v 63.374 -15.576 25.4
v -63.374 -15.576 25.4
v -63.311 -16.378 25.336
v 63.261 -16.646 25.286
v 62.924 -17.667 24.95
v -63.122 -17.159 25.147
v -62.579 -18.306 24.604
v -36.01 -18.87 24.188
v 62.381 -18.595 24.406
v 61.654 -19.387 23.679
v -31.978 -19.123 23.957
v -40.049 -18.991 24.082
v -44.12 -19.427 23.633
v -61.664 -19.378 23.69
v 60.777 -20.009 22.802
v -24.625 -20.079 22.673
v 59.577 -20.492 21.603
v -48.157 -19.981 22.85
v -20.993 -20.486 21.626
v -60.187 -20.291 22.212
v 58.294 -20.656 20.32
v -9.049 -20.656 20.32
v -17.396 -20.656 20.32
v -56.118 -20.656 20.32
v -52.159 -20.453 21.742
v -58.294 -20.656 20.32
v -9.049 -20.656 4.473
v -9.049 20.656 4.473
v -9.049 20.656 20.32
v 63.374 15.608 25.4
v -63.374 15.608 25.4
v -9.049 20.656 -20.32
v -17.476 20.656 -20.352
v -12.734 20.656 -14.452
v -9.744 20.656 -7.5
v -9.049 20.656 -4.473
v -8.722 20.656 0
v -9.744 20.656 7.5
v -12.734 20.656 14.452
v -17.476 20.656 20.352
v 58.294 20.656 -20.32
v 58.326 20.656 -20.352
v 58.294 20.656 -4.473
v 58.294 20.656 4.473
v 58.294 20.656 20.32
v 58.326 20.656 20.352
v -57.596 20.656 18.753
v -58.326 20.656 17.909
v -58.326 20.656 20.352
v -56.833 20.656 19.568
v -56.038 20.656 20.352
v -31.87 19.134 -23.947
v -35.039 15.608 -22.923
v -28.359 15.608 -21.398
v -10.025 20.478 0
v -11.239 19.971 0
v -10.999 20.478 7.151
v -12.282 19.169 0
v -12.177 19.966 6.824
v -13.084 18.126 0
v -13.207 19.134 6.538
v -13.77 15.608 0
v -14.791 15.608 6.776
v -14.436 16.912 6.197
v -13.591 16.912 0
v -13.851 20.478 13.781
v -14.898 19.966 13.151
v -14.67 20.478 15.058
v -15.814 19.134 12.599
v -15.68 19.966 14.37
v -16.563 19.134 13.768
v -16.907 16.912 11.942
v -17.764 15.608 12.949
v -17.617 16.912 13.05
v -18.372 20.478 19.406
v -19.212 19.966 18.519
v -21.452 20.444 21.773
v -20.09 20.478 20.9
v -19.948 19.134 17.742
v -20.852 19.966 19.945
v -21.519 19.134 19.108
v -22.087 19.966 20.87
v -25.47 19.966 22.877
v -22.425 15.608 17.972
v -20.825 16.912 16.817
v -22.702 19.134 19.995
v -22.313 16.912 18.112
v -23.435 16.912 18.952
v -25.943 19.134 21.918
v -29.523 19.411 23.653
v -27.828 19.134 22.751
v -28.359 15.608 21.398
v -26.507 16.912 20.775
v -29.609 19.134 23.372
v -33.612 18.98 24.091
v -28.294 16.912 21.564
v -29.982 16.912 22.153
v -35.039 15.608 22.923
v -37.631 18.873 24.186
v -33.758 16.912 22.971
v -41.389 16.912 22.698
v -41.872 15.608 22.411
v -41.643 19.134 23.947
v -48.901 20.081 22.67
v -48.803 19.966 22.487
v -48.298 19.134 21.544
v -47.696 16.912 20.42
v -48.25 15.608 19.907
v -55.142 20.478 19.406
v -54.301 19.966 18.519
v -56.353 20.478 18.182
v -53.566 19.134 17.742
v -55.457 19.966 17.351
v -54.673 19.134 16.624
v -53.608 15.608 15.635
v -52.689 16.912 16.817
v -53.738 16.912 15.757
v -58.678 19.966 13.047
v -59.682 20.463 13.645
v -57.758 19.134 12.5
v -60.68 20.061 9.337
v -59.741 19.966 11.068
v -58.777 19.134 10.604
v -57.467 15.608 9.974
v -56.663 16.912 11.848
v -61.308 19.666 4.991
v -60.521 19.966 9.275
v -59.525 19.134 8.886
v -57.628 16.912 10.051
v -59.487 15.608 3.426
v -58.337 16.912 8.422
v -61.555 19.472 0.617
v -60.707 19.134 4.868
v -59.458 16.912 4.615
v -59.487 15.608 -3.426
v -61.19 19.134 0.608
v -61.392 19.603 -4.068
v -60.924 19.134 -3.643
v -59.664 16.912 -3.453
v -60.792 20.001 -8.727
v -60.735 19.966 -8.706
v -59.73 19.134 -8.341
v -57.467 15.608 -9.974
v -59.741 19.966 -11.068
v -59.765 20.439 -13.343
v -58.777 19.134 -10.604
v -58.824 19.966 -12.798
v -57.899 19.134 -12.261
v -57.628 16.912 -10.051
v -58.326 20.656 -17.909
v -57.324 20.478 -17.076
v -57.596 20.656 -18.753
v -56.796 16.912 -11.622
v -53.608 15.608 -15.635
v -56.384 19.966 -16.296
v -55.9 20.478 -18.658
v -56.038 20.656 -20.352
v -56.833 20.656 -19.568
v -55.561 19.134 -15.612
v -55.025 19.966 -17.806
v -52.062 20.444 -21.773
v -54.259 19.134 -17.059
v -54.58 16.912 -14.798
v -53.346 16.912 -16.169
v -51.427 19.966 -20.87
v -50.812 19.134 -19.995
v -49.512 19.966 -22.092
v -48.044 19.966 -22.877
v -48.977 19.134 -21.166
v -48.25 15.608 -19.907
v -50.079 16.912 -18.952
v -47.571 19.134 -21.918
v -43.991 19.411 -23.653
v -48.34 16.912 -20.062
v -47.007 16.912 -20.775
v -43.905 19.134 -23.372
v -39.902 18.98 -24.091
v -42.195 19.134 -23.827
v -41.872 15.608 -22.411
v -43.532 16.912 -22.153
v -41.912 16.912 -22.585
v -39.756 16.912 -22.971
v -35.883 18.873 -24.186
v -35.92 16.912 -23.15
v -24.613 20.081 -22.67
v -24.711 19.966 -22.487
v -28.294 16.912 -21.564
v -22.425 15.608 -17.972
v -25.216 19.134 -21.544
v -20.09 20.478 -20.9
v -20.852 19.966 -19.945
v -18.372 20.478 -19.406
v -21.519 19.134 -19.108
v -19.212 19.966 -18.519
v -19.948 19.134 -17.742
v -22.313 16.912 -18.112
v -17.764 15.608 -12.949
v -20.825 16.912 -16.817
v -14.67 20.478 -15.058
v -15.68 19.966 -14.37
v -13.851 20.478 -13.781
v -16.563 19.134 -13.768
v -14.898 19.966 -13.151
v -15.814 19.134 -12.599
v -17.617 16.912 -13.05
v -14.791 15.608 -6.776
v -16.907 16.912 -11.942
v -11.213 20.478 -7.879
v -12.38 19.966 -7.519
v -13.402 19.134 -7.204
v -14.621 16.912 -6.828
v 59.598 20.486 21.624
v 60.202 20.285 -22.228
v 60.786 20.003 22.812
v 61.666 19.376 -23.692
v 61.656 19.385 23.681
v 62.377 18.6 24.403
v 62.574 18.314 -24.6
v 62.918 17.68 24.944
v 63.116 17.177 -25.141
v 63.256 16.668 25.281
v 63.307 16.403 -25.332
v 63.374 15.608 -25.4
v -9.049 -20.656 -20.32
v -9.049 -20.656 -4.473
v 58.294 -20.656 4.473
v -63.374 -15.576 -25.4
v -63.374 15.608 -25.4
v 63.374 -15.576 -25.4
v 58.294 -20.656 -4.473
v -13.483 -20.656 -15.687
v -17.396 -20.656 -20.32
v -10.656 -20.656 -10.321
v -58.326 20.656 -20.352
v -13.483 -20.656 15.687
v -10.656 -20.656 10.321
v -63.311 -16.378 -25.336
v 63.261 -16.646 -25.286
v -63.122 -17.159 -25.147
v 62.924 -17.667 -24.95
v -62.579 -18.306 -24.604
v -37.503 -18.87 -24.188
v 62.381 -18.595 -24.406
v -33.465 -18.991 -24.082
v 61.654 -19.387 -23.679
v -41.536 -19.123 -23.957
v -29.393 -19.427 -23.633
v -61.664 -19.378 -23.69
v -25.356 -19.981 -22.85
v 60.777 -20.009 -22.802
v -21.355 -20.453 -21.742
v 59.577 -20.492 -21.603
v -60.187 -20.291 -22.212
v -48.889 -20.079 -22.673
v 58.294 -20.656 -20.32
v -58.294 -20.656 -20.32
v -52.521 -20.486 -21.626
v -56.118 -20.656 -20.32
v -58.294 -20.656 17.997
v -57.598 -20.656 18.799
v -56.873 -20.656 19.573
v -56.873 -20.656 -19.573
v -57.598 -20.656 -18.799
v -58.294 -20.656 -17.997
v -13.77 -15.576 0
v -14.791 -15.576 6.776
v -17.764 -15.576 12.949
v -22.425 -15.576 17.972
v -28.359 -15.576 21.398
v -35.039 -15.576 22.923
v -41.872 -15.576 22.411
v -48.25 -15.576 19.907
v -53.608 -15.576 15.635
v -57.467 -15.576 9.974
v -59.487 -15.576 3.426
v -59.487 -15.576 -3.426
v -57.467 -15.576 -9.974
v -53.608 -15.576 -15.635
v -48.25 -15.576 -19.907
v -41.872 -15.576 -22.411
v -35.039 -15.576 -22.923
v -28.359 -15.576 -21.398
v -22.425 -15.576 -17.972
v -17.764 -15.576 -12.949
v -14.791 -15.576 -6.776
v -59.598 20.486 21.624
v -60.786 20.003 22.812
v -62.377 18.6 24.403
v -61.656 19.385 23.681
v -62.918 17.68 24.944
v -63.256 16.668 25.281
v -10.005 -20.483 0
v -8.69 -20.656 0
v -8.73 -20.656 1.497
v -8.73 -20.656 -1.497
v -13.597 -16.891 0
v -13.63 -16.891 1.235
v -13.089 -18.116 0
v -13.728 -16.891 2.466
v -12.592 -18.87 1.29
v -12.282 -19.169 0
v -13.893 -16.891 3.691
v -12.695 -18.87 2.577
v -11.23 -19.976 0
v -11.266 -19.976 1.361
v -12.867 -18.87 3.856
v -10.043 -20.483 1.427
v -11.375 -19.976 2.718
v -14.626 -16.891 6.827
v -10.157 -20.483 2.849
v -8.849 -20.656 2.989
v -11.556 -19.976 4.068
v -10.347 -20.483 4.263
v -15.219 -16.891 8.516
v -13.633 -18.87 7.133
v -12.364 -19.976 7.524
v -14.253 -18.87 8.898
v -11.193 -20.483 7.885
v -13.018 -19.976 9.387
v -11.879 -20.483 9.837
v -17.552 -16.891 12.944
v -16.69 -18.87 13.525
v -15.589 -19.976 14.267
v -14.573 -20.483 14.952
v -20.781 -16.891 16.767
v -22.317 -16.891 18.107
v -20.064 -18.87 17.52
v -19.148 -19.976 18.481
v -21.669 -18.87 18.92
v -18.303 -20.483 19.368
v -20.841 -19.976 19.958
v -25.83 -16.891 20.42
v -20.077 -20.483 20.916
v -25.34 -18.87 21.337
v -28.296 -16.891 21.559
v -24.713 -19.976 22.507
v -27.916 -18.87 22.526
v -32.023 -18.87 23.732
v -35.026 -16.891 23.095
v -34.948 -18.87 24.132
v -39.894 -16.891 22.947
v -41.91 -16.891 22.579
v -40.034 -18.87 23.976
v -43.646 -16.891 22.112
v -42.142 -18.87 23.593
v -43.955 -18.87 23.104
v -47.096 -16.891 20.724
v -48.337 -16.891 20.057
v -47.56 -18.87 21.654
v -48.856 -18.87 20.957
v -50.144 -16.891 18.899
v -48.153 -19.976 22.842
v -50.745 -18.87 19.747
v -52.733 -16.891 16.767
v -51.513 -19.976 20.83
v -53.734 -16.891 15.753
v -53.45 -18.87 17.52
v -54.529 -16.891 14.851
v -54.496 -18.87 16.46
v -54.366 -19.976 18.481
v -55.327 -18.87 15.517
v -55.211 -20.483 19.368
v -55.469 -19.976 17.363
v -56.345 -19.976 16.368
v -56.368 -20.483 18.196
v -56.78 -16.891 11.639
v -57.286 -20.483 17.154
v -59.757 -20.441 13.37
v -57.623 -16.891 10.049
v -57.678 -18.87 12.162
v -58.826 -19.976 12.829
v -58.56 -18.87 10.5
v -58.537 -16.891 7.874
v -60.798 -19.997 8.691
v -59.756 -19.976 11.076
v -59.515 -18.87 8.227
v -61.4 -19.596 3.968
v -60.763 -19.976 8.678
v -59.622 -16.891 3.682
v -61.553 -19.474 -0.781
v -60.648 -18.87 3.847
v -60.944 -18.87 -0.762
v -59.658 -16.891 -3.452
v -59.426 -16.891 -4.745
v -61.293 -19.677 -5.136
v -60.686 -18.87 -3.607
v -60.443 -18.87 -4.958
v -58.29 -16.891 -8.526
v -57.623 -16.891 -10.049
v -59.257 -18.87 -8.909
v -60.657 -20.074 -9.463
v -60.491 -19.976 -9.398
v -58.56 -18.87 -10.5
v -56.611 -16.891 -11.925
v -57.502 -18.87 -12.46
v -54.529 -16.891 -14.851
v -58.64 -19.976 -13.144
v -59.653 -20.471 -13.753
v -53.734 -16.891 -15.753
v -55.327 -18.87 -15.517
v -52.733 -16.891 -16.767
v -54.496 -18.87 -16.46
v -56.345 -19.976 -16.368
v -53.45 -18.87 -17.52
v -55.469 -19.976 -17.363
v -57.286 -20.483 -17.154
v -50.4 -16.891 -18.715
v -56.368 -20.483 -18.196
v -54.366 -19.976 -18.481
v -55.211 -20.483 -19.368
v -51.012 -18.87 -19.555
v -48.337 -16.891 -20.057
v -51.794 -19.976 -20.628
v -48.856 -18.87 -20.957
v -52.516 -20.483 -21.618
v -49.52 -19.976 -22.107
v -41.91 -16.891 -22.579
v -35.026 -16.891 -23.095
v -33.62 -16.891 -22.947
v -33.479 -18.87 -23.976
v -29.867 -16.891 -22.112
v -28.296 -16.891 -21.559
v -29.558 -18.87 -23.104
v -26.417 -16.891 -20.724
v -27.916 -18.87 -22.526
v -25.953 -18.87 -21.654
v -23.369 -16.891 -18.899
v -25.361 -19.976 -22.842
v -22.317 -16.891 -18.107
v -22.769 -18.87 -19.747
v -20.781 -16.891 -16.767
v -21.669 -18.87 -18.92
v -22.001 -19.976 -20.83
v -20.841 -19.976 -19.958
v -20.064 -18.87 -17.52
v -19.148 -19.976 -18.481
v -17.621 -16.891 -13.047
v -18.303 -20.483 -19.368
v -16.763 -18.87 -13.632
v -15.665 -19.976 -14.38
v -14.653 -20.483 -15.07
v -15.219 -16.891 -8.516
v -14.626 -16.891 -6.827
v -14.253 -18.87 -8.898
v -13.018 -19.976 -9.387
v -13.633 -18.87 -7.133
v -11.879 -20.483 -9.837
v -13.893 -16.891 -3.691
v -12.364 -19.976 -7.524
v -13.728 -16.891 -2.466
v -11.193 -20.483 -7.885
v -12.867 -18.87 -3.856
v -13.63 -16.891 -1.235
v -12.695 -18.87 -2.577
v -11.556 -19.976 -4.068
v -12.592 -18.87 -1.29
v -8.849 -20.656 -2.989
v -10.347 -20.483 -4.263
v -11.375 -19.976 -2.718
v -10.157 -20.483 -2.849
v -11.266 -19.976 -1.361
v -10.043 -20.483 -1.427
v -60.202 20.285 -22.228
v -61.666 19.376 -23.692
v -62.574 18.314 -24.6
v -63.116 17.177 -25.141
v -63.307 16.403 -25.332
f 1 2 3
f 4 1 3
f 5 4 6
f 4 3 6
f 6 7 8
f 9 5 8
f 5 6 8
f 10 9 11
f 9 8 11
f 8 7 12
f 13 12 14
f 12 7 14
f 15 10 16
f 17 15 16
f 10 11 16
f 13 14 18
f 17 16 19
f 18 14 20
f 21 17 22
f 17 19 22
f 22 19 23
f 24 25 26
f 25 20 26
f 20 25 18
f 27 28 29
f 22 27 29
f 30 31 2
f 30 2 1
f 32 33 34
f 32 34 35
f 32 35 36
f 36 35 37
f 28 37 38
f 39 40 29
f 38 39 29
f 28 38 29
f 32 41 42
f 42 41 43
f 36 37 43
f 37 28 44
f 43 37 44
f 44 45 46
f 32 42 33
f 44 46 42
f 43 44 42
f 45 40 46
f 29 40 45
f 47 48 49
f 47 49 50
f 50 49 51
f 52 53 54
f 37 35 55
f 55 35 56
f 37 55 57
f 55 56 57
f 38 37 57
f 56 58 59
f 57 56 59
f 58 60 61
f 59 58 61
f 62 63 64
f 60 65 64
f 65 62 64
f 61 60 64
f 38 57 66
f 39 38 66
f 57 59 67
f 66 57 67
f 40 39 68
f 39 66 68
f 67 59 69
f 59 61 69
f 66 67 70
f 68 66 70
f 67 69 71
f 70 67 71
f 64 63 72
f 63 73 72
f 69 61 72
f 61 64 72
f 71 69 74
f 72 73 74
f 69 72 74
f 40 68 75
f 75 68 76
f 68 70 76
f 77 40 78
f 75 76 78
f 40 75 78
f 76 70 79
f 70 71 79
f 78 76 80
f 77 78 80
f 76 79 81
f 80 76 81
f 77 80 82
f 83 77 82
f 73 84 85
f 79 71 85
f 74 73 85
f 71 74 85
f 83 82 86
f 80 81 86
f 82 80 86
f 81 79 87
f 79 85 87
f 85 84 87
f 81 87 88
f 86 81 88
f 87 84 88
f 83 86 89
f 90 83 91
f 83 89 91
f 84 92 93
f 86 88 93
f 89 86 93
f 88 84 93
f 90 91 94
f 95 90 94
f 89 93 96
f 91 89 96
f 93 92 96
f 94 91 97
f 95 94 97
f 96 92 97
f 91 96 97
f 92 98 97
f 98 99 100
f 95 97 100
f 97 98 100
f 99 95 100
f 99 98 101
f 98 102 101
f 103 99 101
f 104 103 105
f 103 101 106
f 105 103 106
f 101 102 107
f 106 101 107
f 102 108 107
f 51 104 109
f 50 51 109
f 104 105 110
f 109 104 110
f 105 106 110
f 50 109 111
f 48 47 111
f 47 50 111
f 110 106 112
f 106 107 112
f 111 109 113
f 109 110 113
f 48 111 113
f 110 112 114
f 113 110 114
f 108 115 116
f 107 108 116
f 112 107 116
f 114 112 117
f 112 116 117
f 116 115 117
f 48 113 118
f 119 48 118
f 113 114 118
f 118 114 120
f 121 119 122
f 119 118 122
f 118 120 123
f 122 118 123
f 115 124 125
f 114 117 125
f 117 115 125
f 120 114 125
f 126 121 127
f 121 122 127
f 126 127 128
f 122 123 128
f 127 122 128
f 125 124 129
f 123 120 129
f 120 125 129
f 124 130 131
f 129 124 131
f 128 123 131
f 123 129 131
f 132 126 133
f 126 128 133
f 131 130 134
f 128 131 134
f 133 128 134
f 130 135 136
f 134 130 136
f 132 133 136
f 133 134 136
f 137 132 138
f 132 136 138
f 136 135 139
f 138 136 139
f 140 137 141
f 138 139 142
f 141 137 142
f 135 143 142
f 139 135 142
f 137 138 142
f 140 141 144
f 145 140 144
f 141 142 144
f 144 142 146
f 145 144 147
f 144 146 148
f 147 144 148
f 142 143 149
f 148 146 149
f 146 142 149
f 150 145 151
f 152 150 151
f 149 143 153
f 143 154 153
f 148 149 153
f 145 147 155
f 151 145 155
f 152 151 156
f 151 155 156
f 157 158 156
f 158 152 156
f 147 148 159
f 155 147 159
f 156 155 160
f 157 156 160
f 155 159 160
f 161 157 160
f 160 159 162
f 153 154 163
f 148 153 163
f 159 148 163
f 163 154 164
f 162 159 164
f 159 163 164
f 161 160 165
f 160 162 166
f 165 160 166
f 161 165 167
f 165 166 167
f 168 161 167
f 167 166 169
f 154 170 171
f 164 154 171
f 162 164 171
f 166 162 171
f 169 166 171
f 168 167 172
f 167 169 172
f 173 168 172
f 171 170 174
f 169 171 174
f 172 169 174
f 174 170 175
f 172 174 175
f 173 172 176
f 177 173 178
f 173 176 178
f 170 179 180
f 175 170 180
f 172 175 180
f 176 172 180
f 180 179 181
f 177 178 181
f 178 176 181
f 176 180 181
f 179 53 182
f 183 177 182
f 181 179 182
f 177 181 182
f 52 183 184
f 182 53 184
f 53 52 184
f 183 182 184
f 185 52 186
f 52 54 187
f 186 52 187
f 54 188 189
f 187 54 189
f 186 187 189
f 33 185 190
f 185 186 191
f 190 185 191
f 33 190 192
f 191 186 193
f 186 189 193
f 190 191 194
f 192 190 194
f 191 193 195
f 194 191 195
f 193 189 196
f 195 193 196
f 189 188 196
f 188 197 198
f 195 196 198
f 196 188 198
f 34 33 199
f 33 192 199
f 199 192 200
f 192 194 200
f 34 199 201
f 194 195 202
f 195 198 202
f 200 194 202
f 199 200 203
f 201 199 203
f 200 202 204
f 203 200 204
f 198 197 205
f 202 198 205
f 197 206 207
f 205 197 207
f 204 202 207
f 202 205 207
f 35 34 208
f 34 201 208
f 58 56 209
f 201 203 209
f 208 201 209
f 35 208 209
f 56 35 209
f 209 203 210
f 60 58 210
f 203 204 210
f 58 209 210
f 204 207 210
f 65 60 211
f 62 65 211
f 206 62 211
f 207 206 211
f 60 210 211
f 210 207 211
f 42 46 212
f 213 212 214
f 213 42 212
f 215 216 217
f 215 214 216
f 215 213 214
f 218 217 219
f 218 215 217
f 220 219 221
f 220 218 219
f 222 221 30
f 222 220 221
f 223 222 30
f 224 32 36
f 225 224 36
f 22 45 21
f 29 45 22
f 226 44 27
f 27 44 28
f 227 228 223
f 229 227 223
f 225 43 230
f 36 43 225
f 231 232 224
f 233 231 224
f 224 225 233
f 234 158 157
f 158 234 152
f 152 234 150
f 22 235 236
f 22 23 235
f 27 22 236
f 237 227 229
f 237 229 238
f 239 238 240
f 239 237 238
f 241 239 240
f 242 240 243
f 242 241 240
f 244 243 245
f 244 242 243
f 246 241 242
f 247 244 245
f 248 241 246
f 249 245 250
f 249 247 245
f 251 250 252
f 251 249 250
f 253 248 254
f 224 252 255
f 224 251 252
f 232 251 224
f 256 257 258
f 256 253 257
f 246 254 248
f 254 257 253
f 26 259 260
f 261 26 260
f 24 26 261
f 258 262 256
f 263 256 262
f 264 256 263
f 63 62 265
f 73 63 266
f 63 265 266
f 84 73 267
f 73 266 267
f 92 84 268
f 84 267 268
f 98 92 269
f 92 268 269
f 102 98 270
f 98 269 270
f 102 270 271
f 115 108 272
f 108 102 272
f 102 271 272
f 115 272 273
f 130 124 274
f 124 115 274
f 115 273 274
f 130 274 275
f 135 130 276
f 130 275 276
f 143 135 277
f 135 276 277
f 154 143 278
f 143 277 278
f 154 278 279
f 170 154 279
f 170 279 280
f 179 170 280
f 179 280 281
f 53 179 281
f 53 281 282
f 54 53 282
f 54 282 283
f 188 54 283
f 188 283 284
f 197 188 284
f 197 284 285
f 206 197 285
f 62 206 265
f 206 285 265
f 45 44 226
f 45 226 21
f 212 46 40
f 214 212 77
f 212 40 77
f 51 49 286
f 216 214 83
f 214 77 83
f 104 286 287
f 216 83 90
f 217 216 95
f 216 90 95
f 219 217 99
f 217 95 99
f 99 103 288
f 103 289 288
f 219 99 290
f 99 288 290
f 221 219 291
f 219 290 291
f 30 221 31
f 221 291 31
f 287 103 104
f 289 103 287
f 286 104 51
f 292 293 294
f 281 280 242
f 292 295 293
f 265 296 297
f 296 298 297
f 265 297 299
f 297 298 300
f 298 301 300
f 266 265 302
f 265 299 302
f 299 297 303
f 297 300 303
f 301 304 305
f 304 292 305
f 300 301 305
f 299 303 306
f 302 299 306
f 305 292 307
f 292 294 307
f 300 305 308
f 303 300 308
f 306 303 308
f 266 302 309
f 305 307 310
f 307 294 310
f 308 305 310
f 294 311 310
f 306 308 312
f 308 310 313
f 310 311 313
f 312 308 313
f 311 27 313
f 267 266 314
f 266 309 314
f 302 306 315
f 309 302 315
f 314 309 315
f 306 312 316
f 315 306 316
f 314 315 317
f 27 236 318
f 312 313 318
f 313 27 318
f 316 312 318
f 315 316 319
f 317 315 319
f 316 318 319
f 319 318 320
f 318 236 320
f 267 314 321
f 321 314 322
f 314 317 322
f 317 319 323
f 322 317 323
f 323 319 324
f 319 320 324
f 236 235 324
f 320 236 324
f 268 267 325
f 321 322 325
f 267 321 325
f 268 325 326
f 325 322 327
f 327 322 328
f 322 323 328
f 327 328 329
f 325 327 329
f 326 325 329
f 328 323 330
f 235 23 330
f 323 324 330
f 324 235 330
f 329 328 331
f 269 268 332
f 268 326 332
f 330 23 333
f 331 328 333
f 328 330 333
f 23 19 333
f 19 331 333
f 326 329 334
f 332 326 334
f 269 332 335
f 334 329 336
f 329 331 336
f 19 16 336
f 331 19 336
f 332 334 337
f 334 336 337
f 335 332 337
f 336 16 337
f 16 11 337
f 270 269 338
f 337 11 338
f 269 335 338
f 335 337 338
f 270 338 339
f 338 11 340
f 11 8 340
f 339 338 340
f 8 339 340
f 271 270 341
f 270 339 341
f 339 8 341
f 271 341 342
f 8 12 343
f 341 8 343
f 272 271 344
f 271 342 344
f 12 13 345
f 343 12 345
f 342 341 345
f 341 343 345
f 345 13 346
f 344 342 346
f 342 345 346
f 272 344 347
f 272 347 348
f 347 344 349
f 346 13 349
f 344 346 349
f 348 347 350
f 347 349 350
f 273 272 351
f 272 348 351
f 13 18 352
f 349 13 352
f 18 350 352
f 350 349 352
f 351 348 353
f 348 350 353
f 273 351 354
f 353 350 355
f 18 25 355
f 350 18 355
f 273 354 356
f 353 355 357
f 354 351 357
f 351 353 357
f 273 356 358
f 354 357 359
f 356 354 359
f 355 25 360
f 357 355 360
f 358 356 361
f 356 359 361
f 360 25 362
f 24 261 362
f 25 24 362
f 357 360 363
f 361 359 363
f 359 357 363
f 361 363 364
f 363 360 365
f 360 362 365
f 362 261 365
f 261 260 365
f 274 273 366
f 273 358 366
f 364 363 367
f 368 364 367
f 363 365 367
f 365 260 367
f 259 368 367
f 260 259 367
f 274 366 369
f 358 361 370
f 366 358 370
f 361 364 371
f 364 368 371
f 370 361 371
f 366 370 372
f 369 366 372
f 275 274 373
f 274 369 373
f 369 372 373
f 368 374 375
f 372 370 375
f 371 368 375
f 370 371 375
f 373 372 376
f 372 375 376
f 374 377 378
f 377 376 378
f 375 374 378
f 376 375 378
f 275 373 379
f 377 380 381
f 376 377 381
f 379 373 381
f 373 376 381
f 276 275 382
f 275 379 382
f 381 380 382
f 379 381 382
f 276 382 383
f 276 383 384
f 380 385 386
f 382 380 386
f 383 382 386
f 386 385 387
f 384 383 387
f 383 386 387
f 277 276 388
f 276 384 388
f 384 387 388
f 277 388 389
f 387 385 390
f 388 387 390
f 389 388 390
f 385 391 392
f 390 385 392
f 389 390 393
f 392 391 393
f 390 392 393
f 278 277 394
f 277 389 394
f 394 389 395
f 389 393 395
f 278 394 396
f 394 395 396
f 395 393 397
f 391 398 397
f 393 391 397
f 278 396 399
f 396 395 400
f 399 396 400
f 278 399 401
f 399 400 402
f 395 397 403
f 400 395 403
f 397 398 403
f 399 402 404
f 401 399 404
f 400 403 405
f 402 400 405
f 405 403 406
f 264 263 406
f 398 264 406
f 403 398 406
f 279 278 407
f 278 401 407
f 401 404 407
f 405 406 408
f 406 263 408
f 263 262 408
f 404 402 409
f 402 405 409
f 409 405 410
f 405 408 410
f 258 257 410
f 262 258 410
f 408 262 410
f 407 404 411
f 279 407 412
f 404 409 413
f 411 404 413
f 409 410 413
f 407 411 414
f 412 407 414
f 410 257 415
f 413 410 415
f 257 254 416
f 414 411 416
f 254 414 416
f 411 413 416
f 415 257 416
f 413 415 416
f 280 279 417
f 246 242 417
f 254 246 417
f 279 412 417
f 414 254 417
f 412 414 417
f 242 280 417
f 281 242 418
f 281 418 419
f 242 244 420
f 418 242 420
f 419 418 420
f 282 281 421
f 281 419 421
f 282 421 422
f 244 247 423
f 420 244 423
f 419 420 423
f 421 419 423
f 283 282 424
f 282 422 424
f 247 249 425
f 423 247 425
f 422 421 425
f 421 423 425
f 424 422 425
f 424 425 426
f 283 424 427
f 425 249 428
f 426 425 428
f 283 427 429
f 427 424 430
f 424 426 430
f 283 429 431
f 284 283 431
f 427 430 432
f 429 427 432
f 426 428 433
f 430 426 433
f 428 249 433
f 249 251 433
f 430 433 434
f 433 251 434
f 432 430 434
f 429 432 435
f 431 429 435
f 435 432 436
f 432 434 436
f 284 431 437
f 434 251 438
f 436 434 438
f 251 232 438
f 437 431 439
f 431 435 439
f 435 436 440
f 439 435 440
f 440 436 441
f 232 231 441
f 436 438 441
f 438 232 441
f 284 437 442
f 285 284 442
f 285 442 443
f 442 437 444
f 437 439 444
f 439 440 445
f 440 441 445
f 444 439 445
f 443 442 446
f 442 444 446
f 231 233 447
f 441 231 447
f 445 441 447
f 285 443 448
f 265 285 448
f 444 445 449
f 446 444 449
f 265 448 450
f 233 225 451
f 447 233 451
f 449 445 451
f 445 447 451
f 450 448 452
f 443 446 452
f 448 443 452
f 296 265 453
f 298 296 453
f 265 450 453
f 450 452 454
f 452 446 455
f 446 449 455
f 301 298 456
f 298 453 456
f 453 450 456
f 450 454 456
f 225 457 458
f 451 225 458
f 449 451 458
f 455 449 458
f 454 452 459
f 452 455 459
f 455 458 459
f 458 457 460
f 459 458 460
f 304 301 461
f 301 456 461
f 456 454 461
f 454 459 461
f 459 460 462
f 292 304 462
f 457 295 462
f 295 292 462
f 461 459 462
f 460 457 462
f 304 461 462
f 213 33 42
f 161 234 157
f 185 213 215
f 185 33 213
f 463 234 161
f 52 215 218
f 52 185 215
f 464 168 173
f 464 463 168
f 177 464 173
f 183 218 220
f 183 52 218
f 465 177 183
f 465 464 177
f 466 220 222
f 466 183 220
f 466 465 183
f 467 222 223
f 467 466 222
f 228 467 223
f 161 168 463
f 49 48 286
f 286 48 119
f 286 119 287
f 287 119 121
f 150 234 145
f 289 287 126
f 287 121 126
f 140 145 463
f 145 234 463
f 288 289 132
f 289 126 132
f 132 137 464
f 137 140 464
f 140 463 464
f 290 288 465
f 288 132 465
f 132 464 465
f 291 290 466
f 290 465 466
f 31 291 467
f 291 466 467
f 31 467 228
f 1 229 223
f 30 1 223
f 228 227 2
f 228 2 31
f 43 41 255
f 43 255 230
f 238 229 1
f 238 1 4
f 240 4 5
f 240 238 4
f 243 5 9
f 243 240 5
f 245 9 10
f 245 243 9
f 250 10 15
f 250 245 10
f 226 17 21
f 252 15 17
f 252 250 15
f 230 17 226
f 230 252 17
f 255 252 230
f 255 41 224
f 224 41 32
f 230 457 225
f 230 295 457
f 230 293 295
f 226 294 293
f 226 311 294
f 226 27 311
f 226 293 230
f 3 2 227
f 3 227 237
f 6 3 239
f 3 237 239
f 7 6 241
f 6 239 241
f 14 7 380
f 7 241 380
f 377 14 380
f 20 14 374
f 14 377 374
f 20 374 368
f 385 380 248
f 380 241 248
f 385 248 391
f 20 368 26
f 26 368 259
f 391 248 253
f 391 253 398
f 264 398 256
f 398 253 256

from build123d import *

# Parameters (mm, degrees)
F0_W        = 126.7489343882
F0_H        = 41.312854737
F1_DEPTH    = 25.4
F2_R        = 22.987
F3_DEPTH    = 41.313854737
F4_T1_DEPTH = 76.2
F4_T3_DEPTH = 152.1489343882
F5_T1_DEPTH = 152.1484343931
F5_T3_DEPTH = 76.1995000049
F6_W        = 67.343034428
F6_H        = 15.8471396435
F7_DEPTH    = 41.313854837


# Not quite as in the source:
# - a fillet or chamfer that OpenCascade refuses, or shapes differently, is made with other operations: its cross-section is extruded or revolved along the edge and cut away or added


with BuildPart() as f1:
    # F0 (on Top) → F1 (new body, symmetric)
    with BuildSketch(Plane.XY):
        Rectangle(F0_W, F0_H)
    extrude(amount=F1_DEPTH, both=True)

    # F2 (on face) → F3 (cut, through all)
    with BuildSketch(Plane.XZ.offset(20.6564273685)):
        with Locations((-36.7568694055, 0)):
            Circle(F2_R)
    extrude(amount=-F3_DEPTH, mode=Mode.SUBTRACT)

    # F4: fillet of radius 5.08 on 5 edges, made by hand

    # F4_s2 → F4_t1 (cut)
    with BuildSketch(Plane.XY.offset(-38.1)):
        with BuildLine():
            ThreePointArc((-63.3744671941, -15.5764273685), (-61.8865696425, -19.1685298169), (-58.2944671941, -20.6564273685))
            Line((-58.2944671941, -20.6564273685), (-63.3744671941, -20.6564273685))
            Line((-63.3744671941, -20.6564273685), (-63.3744671941, -15.5764273685))
        make_face()
        with BuildLine():
            ThreePointArc((63.3744671941, -15.5764273685), (61.8865696425, -19.1685298169), (58.2944671941, -20.6564273685))
            Line((58.2944671941, -20.6564273685), (63.3744671941, -20.6564273685))
            Line((63.3744671941, -20.6564273685), (63.3744671941, -15.5764273685))
        make_face()
    extrude(amount=F4_T1_DEPTH, mode=Mode.SUBTRACT)

    # F4_s4 → F4_t3 (cut)
    with BuildSketch(Plane.YZ.offset(-76.0744671941)):
        with BuildLine():
            ThreePointArc((-15.5764273685, -25.4), (-19.1685298169, -23.9121024484), (-20.6564273685, -20.32))
            Line((-20.6564273685, -20.32), (-20.6564273685, -25.4))
            Line((-20.6564273685, -25.4), (-15.5764273685, -25.4))
        make_face()
        with BuildLine():
            ThreePointArc((-15.5764273685, 25.4), (-19.1685298169, 23.9121024484), (-20.6564273685, 20.32))
            Line((-20.6564273685, 20.32), (-20.6564273685, 25.4))
            Line((-20.6564273685, 25.4), (-15.5764273685, 25.4))
        make_face()
    extrude(amount=F4_T3_DEPTH, mode=Mode.SUBTRACT)

    # F4_s5 → F4_t6 (revolve, cut)
    with BuildSketch(Plane.XY):
        with BuildLine():
            ThreePointArc((-13.7698694055, -15.5764273685), (-12.2819718539, -19.1685298169), (-8.6898694055, -20.6564273685))
            Line((-8.6898694055, -20.6564273685), (-13.7698694055, -20.6564273685))
            Line((-13.7698694055, -20.6564273685), (-13.7698694055, -15.5764273685))
        make_face()
    revolve(axis=Axis((-36.7568694055, -20.6564273685, 0), (0, -1, 0)), mode=Mode.SUBTRACT)

    # F5: fillet of radius 5.08 on 5 edges, made by hand

    # F5_s2 → F5_t1 (cut)
    with BuildSketch(Plane.YZ.offset(-76.0742171965)):
        with BuildLine():
            ThreePointArc((20.6565273685, -20.3201), (19.1686298169, -23.9122024484), (15.5765273685, -25.4001))
            Line((15.5765273685, -25.4001), (15.5765273685, -25.5017))
            ThreePointArc((15.5765273685, -25.5017), (18.1164773685, -25.5016), (20.6564273685, -25.5016))
            Line((20.6564273685, -25.5016), (20.7580273685, -25.4))
            ThreePointArc((20.7580273685, -25.4), (20.7580273685, -22.86005), (20.7581273685, -20.3201))
            Line((20.7581273685, -20.3201), (20.6565273685, -20.3201))
        make_face()
        with BuildLine():
            ThreePointArc((20.6565273685, 20.3201), (19.1686298169, 23.9122024484), (15.5765273685, 25.4001))
            Line((15.5765273685, 25.4001), (15.5765273685, 25.5017))
            ThreePointArc((15.5765273685, 25.5017), (18.1164773685, 25.5016), (20.6564273685, 25.5016))
            Line((20.6564273685, 25.5016), (20.7580273685, 25.4))
            ThreePointArc((20.7580273685, 25.4), (20.7580273685, 22.86005), (20.7581273685, 20.3201))
            Line((20.7581273685, 20.3201), (20.6565273685, 20.3201))
        make_face()
    extrude(amount=F5_T1_DEPTH, mode=Mode.SUBTRACT)

    # F5_s4 → F5_t3 (cut)
    with BuildSketch(Plane.XY.offset(-38.0997500025)):
        with BuildLine():
            ThreePointArc((58.2945671941, 20.6565273685), (61.8866696425, 19.1686298169), (63.3745671941, 15.5765273685))
            Line((63.3745671941, 15.5765273685), (63.4761671941, 15.5765273685))
            ThreePointArc((63.4761671941, 15.5765273685), (63.4760671941, 18.1164773685), (63.4760671941, 20.6564273685))
            Line((63.4760671941, 20.6564273685), (63.3744671941, 20.7580273685))
            ThreePointArc((63.3744671941, 20.7580273685), (60.8345171941, 20.7580273685), (58.2945671941, 20.7581273685))
            Line((58.2945671941, 20.7581273685), (58.2945671941, 20.6565273685))
        make_face()
        with BuildLine():
            ThreePointArc((-58.2945671941, 20.6565273685), (-61.8866696425, 19.1686298169), (-63.3745671941, 15.5765273685))
            Line((-63.3745671941, 15.5765273685), (-63.4761671941, 15.5765273685))
            ThreePointArc((-63.4761671941, 15.5765273685), (-63.4760671941, 18.1164773685), (-63.4760671941, 20.6564273685))
            Line((-63.4760671941, 20.6564273685), (-63.3744671941, 20.7580273685))
            ThreePointArc((-63.3744671941, 20.7580273685), (-60.8345171941, 20.7580273685), (-58.2945671941, 20.7581273685))
            Line((-58.2945671941, 20.7581273685), (-58.2945671941, 20.6565273685))
        make_face()
    extrude(amount=F5_T3_DEPTH, mode=Mode.SUBTRACT)

    # F5_s5 → F5_t6 (revolve, cut)
    with BuildSketch(Plane.XY):
        with BuildLine():
            ThreePointArc((-8.6899694055, 20.6565273685), (-12.2820718539, 19.1686298169), (-13.7699694055, 15.5765273685))
            Line((-13.7699694055, 15.5765273685), (-13.8715694055, 15.5765273685))
            ThreePointArc((-13.8715694055, 15.5765273685), (-13.8714694055, 18.1164773685), (-13.8714694055, 20.6564273685))
            Line((-13.8714694055, 20.6564273685), (-13.7698694055, 20.7580273685))
            ThreePointArc((-13.7698694055, 20.7580273685), (-11.2299194055, 20.7580273685), (-8.6899694055, 20.7581273685))
            Line((-8.6899694055, 20.7581273685), (-8.6899694055, 20.6565273685))
        make_face()
    revolve(axis=Axis((-36.7568694055, 20.6564273685, 0), (0, -1, 0)), mode=Mode.SUBTRACT)

    # F6 (on face) → F7 (cut, through all)
    with BuildSketch(Plane(origin=(0, 20.6564273685, 0), x_dir=(-1, 0, 0), z_dir=(0, 1, 0))):
        with Locations((-24.6229499801, -12.3964301783)):
            Rectangle(F6_W, F6_H)
        with Locations((-24.6229499801, 12.3964301783)):
            Rectangle(F6_W, F6_H)
    extrude(amount=-F7_DEPTH, mode=Mode.SUBTRACT)


solid = f1.part
